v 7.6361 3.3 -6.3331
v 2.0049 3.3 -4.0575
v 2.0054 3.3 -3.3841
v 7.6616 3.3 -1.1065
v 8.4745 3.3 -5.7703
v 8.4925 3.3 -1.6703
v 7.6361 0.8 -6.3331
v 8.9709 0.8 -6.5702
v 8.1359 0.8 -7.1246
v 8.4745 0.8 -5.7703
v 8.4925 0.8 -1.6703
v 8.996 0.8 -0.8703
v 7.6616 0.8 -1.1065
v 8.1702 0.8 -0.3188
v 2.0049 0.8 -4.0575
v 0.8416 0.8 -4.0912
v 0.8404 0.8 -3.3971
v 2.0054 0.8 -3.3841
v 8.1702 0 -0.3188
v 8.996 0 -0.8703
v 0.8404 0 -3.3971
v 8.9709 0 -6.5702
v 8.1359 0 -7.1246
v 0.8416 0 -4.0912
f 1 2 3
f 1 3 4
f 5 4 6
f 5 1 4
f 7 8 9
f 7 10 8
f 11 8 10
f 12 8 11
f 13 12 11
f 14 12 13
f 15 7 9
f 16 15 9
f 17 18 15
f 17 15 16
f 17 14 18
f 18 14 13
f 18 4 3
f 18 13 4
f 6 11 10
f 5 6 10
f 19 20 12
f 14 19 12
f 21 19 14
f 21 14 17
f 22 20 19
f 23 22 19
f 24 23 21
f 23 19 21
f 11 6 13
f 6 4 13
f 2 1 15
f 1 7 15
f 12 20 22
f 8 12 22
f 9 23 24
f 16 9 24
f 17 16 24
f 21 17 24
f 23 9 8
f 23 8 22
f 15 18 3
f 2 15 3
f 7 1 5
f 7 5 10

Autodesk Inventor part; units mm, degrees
ref_plane "YZ Plane" through (0, 0, 0) normal (1, 0, 0) x (0, 1, 0)
ref_plane "XZ Plane" through (0, 0, 0) normal (0, 1, 0) x (-1, 0, 0)
ref_plane "XY Plane" through (0, 0, 0) normal (0, 0, 1) x (1, 0, 0)
sketch "Náčrt1" plane through (0, 0, 0) normal (0, 1, 0) x (-1, 0, 0)
  line L0 (-9, 0.0297) -> (-8.9669, -7.4702)
  line L1 (-8.9669, -7.4702) -> (-0.0106, -3.7456)
  line L2 (-9, 0.0297) -> (-0.0106, -3.7456)
  point P0 (0, 0)
  dimension "d1" = 7.5
  dimension "d23" = 9.7
  dimension "d24" = 9.75
extrude "Vysunutí1" add sketch "Náčrt1" along normal blind 0.8
sketch "Náčrt2" plane through (0, 0.8, 0) normal (0, 1, 0) x (1, 0, 0)
  line L0 (8.4965, 0.7703) -> (8.4705, 6.6703)
  line L1 (9, -0.0297) -> (8.9669, 7.4702) projected
  line L2 (8.4705, 6.6703) -> (1.1705, 3.7203)
  line L3 (8.4965, 0.7703) -> (1.1705, 3.7203)
  point P0 (0, 0)
  dimension "d6" = 0.5
  dimension "d16" = 5.9
  dimension "d17" = 0.8
  dimension "d18" = 2.95
extrude "Vysunutí2" add sketch "Náčrt2" along normal blind 2.5
chamfer "Zkosení1" distance 0.9 angle 45 3 edges at (1.1705, 2.05, -3.7203) (8.4965, 2.05, -0.7703) (8.4705, 2.05, -6.6703)
chamfer "Zkosení2" distance 0.9 angle 45 3 edges at (9, 0.4, 0.0297) (8.9669, 0.4, -7.4702) (0.0106, 0.4, -3.7456)
properties part number "SideButton"
